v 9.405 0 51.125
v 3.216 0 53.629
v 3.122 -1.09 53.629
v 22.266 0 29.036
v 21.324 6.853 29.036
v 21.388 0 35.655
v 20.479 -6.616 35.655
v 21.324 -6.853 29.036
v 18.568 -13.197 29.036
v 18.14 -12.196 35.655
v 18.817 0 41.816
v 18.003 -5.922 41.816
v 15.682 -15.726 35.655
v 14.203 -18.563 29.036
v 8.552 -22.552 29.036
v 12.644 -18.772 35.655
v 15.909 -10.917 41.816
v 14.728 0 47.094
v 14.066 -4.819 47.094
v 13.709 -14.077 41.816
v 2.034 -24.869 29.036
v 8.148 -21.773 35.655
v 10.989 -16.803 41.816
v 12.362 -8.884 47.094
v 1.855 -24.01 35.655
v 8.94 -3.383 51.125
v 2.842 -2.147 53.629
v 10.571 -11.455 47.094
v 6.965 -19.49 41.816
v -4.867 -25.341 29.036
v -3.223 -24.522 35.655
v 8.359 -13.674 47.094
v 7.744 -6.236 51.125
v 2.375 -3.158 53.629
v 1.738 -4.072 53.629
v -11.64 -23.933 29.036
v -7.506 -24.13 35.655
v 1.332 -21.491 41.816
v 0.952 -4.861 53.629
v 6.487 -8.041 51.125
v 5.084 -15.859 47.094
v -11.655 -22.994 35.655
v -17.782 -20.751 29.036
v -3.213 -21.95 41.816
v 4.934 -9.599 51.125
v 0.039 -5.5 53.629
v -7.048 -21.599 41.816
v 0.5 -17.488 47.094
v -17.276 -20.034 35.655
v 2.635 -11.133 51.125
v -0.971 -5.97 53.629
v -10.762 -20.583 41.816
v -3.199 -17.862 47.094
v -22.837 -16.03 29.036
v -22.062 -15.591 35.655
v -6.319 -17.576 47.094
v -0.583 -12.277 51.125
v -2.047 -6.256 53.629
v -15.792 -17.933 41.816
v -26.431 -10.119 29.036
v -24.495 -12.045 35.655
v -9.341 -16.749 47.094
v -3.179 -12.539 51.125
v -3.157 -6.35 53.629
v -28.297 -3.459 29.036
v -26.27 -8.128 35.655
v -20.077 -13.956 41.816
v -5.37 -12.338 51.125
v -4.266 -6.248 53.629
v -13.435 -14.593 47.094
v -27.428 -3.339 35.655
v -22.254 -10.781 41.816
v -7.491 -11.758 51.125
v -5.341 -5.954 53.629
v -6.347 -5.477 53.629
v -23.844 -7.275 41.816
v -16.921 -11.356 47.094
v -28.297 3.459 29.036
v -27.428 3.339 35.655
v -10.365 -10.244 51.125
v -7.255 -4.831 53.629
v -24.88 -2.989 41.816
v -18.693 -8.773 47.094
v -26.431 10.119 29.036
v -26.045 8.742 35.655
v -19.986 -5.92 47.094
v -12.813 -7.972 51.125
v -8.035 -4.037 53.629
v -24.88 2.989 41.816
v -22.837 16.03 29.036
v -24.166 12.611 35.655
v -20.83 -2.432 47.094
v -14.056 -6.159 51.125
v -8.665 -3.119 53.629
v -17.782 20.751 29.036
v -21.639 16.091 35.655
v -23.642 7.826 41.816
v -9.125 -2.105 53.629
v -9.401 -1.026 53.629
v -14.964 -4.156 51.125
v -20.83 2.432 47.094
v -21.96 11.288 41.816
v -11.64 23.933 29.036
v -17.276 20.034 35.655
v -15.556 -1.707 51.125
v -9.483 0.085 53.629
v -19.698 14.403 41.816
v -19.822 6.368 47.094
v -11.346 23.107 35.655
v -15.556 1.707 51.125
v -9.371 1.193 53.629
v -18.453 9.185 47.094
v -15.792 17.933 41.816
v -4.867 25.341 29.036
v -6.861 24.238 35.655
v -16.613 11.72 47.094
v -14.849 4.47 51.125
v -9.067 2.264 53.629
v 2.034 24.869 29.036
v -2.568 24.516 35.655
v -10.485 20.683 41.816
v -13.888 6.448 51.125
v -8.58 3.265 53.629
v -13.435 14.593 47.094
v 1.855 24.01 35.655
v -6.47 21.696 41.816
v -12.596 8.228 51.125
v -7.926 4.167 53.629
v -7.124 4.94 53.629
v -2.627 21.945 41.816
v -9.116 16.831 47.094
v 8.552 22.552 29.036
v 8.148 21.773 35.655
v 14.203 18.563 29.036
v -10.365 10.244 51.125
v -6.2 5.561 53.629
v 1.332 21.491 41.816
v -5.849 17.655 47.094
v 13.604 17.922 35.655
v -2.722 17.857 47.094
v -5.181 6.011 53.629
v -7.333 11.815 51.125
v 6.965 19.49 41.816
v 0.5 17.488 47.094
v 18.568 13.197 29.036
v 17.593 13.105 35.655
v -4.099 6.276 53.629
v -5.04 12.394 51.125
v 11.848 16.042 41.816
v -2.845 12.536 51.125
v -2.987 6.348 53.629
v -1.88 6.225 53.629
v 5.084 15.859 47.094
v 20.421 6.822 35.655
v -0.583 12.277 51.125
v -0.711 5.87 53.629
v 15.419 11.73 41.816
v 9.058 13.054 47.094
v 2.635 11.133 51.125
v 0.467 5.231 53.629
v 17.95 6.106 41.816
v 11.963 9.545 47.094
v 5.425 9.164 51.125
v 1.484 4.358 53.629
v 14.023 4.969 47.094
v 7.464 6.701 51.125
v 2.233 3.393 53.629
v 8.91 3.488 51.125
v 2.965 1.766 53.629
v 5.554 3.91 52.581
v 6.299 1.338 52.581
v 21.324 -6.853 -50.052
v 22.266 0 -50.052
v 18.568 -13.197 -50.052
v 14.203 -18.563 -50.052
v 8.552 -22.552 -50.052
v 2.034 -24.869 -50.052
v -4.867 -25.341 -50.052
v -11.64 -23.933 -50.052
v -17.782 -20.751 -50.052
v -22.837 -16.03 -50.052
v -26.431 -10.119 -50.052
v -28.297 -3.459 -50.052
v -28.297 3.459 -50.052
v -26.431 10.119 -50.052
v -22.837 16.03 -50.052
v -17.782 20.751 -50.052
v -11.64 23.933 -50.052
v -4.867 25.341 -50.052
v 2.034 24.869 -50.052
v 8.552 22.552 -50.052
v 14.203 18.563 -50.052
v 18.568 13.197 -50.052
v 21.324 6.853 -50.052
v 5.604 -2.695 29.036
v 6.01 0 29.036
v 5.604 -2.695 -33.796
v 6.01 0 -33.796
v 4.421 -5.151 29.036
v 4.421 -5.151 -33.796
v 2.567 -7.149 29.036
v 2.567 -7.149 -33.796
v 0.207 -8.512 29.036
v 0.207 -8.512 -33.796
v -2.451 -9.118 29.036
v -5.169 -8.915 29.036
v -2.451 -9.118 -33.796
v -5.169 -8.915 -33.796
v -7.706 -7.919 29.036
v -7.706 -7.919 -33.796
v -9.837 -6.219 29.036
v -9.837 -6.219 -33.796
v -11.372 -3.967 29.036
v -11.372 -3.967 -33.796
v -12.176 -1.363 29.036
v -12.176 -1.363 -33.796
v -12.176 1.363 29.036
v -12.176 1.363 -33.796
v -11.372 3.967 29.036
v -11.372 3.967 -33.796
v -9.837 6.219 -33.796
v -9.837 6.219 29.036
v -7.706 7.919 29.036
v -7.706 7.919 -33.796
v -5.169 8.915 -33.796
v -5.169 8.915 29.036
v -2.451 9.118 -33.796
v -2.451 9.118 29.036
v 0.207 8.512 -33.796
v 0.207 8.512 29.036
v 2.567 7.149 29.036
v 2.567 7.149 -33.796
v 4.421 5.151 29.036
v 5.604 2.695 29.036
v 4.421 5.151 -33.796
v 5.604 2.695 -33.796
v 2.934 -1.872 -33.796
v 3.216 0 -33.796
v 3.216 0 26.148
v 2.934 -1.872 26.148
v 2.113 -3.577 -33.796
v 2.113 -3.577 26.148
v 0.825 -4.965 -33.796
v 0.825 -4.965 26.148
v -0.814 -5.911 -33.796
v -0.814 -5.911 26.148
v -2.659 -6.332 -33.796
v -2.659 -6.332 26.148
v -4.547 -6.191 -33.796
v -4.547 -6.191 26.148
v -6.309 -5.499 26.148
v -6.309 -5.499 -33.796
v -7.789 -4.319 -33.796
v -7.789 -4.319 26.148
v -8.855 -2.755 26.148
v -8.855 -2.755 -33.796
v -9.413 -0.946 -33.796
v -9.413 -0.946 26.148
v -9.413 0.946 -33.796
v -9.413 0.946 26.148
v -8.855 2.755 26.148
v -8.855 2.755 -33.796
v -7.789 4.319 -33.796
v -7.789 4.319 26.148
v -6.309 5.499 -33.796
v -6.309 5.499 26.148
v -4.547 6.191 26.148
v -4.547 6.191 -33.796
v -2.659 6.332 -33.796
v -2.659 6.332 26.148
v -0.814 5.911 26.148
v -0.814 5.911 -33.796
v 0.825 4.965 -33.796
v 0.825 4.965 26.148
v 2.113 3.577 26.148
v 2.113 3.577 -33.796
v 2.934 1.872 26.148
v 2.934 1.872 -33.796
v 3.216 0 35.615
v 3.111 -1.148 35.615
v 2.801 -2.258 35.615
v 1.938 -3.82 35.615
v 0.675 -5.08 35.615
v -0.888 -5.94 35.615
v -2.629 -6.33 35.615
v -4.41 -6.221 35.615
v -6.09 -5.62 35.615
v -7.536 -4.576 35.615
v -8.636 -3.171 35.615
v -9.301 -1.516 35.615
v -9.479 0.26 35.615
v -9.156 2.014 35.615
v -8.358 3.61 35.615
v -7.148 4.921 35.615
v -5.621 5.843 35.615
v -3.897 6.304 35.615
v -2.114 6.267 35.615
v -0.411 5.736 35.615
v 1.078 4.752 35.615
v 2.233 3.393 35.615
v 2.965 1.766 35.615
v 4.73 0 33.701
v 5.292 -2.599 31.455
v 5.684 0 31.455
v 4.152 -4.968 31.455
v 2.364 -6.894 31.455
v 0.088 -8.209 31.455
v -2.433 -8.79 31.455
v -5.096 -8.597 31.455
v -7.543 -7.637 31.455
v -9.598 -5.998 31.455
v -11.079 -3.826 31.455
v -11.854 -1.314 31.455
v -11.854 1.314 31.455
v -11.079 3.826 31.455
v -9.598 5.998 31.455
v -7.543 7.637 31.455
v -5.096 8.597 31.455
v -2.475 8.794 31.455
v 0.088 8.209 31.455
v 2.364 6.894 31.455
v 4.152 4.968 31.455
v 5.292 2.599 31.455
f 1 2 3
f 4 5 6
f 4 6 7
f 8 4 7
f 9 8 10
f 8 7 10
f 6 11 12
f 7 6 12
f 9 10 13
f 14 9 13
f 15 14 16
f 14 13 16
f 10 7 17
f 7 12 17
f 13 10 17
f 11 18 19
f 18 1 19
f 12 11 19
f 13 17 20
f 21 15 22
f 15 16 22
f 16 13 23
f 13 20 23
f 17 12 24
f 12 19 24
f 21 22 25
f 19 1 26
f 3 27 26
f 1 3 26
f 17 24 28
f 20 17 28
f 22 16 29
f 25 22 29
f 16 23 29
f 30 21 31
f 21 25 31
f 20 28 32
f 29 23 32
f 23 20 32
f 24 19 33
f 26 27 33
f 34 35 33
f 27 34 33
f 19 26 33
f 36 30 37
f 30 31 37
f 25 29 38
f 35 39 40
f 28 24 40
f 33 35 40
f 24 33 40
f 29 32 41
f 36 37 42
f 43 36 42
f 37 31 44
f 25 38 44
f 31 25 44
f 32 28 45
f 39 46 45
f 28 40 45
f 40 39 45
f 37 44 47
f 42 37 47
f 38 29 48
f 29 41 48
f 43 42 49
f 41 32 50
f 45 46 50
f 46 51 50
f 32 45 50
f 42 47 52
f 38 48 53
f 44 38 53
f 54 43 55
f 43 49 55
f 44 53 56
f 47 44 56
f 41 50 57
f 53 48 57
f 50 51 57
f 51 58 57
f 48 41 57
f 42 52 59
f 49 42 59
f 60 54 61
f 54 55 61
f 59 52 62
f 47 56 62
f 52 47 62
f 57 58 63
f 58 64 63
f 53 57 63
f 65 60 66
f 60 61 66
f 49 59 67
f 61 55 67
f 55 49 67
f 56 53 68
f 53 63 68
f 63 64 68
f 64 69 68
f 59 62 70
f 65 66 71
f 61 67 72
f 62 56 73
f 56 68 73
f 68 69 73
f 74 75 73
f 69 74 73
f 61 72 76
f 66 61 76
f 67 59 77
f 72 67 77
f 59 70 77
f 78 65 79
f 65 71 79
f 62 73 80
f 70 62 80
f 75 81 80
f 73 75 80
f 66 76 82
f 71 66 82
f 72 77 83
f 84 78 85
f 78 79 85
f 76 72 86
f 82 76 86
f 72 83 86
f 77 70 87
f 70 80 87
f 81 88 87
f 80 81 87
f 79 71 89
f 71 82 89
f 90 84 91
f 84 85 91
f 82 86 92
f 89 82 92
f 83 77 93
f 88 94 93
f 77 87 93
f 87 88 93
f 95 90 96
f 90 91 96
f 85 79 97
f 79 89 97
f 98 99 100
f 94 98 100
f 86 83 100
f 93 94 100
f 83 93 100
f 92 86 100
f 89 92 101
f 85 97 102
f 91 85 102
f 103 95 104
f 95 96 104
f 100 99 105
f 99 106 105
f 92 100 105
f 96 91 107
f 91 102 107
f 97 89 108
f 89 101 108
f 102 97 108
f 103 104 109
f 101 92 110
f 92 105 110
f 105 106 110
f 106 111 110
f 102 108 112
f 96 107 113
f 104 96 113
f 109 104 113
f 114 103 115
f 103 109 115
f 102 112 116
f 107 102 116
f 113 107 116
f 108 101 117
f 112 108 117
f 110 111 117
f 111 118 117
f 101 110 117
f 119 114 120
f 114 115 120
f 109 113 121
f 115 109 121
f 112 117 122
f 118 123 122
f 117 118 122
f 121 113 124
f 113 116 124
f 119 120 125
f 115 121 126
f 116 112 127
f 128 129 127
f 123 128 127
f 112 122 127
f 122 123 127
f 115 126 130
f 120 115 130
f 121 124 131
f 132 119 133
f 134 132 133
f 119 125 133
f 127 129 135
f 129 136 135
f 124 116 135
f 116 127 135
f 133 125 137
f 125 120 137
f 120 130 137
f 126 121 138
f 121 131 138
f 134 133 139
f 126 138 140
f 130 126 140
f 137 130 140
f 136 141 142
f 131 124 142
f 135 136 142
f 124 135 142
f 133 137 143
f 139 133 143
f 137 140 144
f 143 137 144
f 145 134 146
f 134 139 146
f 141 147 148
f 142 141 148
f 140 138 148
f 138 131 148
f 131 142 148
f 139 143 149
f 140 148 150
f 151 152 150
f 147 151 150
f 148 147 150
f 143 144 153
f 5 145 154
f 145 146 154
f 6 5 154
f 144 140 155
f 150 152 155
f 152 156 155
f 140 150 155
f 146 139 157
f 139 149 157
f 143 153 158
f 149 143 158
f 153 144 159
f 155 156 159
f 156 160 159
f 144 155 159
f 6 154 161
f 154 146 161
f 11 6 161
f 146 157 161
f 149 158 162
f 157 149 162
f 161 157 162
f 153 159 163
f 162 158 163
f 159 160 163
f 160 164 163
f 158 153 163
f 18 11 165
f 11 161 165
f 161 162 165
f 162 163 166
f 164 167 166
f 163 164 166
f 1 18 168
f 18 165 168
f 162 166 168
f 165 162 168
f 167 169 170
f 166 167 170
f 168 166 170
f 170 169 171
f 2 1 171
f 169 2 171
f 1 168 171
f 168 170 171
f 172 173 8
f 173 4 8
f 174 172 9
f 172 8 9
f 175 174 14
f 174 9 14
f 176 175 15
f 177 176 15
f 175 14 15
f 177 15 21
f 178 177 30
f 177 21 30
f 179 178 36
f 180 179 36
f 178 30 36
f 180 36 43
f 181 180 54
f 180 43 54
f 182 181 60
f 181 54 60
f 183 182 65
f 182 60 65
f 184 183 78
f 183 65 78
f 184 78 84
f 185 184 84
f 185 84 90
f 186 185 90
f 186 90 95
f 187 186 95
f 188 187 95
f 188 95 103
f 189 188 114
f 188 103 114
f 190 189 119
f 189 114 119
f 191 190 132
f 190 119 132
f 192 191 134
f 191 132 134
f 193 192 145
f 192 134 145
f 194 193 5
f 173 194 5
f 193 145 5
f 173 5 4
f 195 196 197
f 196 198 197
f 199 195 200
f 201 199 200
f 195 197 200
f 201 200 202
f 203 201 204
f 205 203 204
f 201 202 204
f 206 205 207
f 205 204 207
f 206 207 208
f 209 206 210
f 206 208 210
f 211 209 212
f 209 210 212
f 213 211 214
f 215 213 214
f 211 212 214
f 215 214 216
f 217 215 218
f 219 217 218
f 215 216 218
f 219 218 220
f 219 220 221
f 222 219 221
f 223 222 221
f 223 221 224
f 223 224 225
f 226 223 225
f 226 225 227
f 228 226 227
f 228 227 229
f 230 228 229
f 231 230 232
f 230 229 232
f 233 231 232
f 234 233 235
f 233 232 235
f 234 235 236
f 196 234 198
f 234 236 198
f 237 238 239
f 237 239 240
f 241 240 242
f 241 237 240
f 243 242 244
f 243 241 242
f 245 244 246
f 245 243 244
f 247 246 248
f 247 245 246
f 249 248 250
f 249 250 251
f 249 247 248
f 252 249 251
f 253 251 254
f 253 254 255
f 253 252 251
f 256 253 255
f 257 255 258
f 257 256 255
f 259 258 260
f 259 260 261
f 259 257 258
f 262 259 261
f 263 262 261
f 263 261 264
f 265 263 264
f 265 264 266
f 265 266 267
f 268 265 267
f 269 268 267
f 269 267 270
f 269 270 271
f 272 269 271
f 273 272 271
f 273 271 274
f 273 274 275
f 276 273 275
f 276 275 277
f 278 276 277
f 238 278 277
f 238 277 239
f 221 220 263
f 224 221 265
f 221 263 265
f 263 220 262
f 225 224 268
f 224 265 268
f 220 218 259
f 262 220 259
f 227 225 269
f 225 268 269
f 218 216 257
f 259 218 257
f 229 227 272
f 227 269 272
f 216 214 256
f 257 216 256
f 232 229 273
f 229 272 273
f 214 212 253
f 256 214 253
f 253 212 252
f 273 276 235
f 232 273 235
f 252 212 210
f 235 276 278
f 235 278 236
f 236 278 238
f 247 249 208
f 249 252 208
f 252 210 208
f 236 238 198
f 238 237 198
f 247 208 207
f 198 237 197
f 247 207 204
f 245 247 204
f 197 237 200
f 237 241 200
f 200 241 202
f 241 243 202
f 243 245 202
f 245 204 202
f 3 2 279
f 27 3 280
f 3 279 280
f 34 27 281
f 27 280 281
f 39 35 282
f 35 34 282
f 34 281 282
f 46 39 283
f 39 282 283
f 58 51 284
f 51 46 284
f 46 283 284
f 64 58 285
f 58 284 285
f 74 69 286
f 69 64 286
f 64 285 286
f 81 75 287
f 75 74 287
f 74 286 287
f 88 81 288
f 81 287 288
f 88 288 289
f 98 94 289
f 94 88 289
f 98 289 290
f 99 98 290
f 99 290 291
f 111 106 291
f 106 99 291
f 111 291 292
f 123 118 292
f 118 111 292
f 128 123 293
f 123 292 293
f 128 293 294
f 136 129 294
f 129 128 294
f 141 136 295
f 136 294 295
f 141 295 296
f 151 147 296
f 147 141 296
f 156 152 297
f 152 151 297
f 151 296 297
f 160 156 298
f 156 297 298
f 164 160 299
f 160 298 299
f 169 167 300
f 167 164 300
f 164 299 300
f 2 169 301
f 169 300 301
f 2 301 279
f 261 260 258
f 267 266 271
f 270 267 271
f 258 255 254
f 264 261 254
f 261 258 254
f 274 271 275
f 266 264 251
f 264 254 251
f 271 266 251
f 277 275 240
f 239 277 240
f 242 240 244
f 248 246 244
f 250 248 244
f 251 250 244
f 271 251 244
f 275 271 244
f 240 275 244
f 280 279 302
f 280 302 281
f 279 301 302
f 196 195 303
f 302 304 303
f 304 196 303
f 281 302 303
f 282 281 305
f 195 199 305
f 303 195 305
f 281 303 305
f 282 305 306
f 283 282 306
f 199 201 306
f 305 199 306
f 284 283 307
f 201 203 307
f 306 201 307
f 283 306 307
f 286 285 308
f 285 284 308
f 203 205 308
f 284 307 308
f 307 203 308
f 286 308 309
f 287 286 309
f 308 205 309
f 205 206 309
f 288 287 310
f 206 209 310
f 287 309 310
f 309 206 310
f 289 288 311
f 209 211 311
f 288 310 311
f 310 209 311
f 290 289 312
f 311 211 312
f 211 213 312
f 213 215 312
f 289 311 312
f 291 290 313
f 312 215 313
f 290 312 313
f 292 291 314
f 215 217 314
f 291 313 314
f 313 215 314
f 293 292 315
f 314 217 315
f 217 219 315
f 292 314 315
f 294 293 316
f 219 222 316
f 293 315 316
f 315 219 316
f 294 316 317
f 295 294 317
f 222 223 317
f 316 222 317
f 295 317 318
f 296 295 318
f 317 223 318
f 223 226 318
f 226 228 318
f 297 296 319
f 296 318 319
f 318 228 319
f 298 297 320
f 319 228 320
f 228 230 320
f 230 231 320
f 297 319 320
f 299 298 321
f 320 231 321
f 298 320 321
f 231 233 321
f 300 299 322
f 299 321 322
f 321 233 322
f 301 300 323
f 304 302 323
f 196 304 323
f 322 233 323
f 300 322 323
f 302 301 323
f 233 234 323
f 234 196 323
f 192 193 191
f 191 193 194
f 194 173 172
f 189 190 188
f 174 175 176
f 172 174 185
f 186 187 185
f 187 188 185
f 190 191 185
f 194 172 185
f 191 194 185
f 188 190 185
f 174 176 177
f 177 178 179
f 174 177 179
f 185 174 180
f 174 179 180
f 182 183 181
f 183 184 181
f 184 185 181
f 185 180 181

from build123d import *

# Parameters (mm, degrees)
F2_R     = 6.35
F3_DEPTH = 104.489224
F4_DEPTH = 76.2


with BuildPart() as f1:
    # F0 (on Front) → F1 (revolve)
    with BuildSketch(Plane.XZ):
        with BuildLine():
            Line((-3.134028, -33.796337), (-3.134028, -50.052336))
            Line((-3.134028, -50.052336), (22.265972, -50.052336))
            Line((22.265972, -50.052336), (22.265972, 29.035888))
            ThreePointArc((22.265972, 29.035888), (14.826484, 46.9964), (-3.134028, 54.435888))
            Line((-3.134028, 54.435888), (-3.134028, 38.179888))
            ThreePointArc((-3.134028, 38.179888), (3.331756, 35.501672), (6.009972, 29.035888))
            Line((6.009972, 29.035888), (6.009972, -33.796337))
            Line((6.009972, -33.796337), (-3.134028, -33.796337))
        make_face()
    revolve(axis=Axis((-3.134028, 0, 2.191776), (0, 0, -1)))

    # F2 (on face) → F3 (cut, through all)
    with BuildSketch(Plane(origin=(0, 0, -50.052336), x_dir=(1, 0, 0), z_dir=(0, 0, -1))):
        with Locations((-3.134028, 0)):
            Circle(F2_R)
    extrude(amount=-F3_DEPTH, mode=Mode.SUBTRACT)

    # F2 (on face) → F4 (join)
    with BuildSketch(Plane(origin=(0, 0, -50.052336), x_dir=(1, 0, 0), z_dir=(0, 0, -1))):
        with Locations((-3.134028, 0)):
            Circle(F2_R)
    extrude(amount=-F4_DEPTH)


solid = f1.part
